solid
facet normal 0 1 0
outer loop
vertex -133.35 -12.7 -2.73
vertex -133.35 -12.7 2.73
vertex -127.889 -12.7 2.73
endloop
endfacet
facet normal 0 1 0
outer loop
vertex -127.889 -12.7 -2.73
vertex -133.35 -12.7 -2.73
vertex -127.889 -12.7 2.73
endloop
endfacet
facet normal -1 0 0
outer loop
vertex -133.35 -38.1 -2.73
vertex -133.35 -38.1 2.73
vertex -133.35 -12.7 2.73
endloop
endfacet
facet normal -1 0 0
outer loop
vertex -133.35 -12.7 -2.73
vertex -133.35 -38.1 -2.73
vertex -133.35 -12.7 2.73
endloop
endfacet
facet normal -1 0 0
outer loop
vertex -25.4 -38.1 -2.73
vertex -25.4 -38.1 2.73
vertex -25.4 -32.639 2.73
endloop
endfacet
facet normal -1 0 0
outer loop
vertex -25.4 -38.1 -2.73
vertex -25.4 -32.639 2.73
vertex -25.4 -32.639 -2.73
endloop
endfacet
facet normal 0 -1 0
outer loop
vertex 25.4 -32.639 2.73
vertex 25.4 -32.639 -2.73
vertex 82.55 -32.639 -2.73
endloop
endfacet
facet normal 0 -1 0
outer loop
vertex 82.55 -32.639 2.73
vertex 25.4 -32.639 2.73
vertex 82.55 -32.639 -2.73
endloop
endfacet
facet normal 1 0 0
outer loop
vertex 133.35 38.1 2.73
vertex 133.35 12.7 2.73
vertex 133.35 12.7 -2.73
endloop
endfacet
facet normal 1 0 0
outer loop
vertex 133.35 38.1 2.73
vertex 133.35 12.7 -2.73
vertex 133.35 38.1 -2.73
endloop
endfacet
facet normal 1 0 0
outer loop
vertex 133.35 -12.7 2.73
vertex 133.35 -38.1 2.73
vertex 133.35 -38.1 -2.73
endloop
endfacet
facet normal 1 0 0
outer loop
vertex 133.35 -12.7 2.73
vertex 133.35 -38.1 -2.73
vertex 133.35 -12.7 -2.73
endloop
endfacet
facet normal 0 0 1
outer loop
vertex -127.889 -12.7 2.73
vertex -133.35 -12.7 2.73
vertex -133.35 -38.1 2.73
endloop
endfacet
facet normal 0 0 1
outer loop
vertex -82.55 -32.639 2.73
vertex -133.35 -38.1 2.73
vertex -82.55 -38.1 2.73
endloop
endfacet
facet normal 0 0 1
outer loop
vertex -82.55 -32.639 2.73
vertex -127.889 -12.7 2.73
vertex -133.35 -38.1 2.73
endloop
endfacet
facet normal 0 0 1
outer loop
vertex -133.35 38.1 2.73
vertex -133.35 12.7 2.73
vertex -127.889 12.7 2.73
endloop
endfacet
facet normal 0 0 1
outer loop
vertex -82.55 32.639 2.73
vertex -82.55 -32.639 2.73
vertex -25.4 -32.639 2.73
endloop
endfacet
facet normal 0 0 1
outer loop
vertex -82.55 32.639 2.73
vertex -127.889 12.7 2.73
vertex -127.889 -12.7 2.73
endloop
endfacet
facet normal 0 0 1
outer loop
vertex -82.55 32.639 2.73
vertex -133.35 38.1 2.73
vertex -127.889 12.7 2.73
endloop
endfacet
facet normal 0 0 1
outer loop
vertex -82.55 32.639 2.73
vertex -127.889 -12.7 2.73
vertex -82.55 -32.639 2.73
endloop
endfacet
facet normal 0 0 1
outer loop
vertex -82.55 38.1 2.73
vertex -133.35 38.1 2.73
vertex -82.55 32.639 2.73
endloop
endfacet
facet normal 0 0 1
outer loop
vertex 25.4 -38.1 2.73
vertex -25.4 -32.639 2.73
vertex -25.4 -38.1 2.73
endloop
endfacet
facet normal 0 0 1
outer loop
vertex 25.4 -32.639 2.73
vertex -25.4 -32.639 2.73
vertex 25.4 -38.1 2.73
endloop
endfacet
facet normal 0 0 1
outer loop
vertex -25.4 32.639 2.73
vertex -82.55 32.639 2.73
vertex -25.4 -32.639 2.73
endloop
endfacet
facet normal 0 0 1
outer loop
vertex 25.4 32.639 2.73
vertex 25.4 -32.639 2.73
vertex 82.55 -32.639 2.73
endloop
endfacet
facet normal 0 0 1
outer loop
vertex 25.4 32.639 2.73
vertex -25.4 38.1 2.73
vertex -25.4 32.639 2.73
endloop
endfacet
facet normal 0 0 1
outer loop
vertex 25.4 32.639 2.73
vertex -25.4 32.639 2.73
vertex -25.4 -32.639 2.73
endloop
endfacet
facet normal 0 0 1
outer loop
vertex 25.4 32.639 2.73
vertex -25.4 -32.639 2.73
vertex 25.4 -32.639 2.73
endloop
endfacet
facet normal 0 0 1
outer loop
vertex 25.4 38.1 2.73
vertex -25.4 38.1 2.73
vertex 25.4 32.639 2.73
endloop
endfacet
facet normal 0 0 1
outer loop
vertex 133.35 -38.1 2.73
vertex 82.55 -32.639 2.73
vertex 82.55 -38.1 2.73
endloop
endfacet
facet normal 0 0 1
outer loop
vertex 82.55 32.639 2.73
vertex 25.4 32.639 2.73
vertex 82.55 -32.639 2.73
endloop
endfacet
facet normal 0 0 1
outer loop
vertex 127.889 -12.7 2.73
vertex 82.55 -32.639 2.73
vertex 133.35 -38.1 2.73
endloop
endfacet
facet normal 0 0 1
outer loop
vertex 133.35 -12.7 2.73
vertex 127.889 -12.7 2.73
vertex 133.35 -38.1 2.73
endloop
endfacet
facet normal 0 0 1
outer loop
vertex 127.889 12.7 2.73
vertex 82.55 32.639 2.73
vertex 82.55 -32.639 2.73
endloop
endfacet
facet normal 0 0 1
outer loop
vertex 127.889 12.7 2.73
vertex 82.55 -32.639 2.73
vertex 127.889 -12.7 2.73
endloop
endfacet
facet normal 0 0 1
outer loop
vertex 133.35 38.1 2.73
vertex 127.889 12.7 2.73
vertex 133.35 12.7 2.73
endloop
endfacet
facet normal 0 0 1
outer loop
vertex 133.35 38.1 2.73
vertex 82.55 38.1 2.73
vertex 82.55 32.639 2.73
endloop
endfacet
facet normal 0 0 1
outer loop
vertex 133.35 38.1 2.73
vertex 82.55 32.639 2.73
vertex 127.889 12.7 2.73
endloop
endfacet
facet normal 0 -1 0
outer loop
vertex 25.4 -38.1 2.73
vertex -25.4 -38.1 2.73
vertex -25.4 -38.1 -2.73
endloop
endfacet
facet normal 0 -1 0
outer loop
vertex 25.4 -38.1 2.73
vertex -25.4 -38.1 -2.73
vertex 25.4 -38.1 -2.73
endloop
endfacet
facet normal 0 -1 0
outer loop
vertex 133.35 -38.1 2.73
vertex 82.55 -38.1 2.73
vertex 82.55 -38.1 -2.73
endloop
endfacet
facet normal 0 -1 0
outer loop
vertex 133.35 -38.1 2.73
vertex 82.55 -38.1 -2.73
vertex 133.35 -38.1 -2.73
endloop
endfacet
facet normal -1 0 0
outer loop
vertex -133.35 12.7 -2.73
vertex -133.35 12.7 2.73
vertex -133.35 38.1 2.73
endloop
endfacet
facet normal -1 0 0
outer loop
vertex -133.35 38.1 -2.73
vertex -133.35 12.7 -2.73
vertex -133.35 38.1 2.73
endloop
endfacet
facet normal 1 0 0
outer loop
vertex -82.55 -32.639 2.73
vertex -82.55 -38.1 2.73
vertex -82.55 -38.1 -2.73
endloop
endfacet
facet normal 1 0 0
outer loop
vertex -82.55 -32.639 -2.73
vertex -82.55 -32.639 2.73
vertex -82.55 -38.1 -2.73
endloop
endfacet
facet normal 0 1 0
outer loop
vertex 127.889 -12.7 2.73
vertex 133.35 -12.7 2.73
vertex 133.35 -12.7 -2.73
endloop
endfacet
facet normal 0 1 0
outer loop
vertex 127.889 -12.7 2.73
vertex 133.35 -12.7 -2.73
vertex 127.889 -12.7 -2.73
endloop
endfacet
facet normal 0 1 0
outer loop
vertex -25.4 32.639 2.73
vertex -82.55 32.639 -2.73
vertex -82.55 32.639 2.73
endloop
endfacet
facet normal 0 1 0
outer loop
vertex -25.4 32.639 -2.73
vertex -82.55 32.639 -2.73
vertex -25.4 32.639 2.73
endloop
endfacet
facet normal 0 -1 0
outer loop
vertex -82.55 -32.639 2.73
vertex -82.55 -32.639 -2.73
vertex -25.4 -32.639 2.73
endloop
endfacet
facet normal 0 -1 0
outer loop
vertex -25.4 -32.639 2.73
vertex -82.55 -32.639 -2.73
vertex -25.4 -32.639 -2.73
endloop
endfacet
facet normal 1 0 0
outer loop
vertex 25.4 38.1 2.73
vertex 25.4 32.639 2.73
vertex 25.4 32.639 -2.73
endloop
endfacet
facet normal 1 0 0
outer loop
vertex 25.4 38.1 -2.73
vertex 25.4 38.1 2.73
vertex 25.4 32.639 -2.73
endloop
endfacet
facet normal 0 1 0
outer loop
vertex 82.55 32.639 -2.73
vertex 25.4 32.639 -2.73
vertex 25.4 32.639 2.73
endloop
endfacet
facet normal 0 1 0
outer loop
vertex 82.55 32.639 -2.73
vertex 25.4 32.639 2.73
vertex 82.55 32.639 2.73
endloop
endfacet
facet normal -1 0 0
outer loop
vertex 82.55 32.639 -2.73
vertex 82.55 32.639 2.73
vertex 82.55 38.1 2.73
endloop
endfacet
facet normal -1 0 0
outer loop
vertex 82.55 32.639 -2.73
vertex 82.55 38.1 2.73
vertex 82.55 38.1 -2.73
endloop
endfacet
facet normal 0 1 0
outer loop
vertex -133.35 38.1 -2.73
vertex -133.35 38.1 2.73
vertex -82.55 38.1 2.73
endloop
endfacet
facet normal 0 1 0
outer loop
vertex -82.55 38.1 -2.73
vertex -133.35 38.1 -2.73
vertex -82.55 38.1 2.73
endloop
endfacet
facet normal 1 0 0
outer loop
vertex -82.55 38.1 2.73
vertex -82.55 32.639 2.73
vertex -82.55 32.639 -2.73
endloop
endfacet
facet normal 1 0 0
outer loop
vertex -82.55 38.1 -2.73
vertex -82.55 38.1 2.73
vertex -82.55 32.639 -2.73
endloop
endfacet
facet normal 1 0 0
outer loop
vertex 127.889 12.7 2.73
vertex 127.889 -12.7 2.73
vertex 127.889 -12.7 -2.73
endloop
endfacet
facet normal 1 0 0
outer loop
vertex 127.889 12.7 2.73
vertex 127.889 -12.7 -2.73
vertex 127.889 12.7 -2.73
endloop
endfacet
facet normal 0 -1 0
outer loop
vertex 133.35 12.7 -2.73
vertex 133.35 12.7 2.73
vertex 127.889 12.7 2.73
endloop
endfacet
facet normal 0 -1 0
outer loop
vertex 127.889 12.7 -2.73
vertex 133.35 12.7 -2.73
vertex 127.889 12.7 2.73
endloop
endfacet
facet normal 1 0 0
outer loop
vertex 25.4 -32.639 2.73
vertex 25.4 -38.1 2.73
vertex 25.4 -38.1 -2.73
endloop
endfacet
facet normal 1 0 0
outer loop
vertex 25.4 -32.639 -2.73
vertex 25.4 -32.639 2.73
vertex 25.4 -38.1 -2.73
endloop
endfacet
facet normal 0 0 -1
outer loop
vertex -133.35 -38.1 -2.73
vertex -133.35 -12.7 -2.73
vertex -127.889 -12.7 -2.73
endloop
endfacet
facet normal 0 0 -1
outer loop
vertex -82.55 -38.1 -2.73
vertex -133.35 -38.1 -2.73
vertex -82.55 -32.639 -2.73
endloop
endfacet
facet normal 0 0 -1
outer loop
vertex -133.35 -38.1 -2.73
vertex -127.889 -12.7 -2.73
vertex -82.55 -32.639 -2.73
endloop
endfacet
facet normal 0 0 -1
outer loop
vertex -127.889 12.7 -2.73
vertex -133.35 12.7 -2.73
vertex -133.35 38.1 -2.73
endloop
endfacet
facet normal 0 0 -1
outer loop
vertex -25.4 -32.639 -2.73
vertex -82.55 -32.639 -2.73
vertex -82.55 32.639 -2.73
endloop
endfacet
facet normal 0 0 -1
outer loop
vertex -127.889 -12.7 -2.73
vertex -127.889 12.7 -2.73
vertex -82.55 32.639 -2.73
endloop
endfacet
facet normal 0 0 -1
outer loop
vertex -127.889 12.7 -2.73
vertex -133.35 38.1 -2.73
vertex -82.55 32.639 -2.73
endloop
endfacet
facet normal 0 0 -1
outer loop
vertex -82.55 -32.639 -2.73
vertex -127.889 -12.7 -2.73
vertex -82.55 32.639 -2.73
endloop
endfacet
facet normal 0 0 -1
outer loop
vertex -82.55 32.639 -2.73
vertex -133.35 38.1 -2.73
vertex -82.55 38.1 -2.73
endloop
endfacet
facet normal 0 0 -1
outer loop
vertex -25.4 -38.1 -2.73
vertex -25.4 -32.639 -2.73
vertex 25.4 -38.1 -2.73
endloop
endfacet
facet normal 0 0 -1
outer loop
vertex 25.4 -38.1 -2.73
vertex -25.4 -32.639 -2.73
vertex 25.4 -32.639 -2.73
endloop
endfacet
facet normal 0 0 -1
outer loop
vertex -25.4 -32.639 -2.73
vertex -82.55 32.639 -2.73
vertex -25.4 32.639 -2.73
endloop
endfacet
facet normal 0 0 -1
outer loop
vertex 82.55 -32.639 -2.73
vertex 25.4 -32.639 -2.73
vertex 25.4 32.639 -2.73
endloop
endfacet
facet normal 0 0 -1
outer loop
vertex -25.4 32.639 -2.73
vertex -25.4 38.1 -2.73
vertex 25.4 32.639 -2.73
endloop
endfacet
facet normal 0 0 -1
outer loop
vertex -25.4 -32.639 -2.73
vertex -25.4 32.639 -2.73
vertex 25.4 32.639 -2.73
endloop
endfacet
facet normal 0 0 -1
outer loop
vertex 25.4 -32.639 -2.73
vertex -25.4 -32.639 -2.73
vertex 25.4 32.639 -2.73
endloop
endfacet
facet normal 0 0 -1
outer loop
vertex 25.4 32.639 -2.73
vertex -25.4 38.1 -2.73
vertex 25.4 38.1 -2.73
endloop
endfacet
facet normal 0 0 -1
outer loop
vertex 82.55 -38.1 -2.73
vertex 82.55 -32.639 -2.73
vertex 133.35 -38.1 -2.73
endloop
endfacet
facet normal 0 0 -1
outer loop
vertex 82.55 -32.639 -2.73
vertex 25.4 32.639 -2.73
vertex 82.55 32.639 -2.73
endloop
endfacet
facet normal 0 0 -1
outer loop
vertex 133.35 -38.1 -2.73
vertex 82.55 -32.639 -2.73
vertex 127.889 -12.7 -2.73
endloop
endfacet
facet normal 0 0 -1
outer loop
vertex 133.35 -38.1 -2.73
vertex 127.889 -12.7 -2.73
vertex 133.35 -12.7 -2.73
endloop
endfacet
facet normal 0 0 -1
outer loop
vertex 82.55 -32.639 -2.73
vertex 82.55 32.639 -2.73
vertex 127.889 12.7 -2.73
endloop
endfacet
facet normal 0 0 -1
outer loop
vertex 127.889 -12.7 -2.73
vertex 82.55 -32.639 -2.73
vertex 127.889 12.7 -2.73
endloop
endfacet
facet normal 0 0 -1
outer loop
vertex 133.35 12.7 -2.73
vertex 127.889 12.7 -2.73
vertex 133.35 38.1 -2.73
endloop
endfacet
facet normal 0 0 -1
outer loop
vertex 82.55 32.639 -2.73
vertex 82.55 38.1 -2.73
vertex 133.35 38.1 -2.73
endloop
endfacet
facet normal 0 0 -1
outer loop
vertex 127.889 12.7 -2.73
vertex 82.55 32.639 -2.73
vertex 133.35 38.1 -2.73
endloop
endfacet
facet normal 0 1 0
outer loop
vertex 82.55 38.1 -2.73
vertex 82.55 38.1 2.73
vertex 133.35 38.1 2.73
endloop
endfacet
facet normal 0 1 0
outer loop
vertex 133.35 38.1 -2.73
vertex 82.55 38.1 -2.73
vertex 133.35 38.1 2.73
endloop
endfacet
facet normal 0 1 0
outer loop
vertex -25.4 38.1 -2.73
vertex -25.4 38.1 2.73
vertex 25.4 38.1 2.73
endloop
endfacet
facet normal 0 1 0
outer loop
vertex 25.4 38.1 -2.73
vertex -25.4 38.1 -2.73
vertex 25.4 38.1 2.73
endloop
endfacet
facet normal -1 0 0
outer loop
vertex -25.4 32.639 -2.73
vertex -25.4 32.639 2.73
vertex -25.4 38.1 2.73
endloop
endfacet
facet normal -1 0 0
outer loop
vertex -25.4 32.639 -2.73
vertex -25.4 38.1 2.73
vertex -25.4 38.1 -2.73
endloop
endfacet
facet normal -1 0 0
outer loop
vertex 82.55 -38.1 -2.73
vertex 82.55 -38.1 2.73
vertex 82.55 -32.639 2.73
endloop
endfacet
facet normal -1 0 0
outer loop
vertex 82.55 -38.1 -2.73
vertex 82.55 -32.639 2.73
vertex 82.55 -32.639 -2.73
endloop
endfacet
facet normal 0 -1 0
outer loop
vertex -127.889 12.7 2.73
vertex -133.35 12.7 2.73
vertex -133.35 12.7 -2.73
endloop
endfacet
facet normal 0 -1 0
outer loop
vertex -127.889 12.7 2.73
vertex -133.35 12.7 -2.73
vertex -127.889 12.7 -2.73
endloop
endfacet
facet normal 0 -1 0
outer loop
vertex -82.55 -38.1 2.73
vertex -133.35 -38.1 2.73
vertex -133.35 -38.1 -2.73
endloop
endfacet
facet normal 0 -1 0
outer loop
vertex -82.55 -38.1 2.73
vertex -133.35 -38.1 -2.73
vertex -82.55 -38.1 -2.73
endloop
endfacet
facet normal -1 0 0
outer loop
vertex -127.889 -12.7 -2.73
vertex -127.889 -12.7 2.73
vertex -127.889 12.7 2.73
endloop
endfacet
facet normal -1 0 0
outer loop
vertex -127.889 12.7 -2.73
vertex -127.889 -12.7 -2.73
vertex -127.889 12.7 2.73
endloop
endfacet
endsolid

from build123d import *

# Parameters (mm, degrees)
SKETCH1_W           = 266.7
SKETCH1_H           = 76.2
BOSS_EXTRUDE1_DEPTH = 2.7305
CAVITY1_START       = -38.1
CAVITY1_OUTLINE_W   = 57.15
CAVITY1_OUTLINE_H   = 5.461
CAVITY1_DEPTH       = 5.461
CAVITY1_START_2     = 32.639
CAVITY1_2_OUTLINE_W = 57.15
CAVITY1_2_OUTLINE_H = 5.461
CAVITY1_2_DEPTH     = 5.461
SKETCH2_W           = 5.461
SKETCH2_H           = 25.4
CUT_EXTRUDE1_DEPTH  = 139.793569811


# Read off the part's stored shape, not the designer's step: Cavity1
with BuildPart() as part:
    # Sketch1 → Boss-Extrude1 (new, symmetric)
    with BuildSketch(Plane.XY):
        Rectangle(SKETCH1_W, SKETCH1_H)
    extrude(amount=BOSS_EXTRUDE1_DEPTH, both=True)

    # Cavity1 outline → Cavity1 (cut)
    with BuildSketch(Plane(origin=(0, 0, 0), x_dir=(1, 0, 0), z_dir=(0, 1, 0)).offset(CAVITY1_START)):
        with Locations((-53.975, 0)):
            Rectangle(CAVITY1_OUTLINE_W, CAVITY1_OUTLINE_H)
        with Locations((53.975, 0)):
            Rectangle(CAVITY1_OUTLINE_W, CAVITY1_OUTLINE_H)
    extrude(amount=CAVITY1_DEPTH, mode=Mode.SUBTRACT)

    # Cavity1 2 outline → Cavity1 2 (cut)
    with BuildSketch(Plane(origin=(0, 0, 0), x_dir=(1, 0, 0), z_dir=(0, 1, 0)).offset(CAVITY1_START_2)):
        with Locations((-53.975, 0)):
            Rectangle(CAVITY1_2_OUTLINE_W, CAVITY1_2_OUTLINE_H)
        with Locations((53.975, 0)):
            Rectangle(CAVITY1_2_OUTLINE_W, CAVITY1_2_OUTLINE_H)
    extrude(amount=CAVITY1_2_DEPTH, mode=Mode.SUBTRACT)

    # Sketch2 → Cut-Extrude1 (cut, through all)
    with BuildSketch(Plane.XY.offset(2.7305)):
        with Locations((-130.6195, 0)):
            Rectangle(SKETCH2_W, SKETCH2_H)
    cut_extrude1 = extrude(amount=-CUT_EXTRUDE1_DEPTH, mode=Mode.SUBTRACT)

    # Mirror1: Cut-Extrude1 across plane
    add(cut_extrude1.mirror(Plane(origin=(0, 0, 0), x_dir=(0, 0, 1), z_dir=(1, 0, 0))), mode=Mode.SUBTRACT)


solid = part.part
